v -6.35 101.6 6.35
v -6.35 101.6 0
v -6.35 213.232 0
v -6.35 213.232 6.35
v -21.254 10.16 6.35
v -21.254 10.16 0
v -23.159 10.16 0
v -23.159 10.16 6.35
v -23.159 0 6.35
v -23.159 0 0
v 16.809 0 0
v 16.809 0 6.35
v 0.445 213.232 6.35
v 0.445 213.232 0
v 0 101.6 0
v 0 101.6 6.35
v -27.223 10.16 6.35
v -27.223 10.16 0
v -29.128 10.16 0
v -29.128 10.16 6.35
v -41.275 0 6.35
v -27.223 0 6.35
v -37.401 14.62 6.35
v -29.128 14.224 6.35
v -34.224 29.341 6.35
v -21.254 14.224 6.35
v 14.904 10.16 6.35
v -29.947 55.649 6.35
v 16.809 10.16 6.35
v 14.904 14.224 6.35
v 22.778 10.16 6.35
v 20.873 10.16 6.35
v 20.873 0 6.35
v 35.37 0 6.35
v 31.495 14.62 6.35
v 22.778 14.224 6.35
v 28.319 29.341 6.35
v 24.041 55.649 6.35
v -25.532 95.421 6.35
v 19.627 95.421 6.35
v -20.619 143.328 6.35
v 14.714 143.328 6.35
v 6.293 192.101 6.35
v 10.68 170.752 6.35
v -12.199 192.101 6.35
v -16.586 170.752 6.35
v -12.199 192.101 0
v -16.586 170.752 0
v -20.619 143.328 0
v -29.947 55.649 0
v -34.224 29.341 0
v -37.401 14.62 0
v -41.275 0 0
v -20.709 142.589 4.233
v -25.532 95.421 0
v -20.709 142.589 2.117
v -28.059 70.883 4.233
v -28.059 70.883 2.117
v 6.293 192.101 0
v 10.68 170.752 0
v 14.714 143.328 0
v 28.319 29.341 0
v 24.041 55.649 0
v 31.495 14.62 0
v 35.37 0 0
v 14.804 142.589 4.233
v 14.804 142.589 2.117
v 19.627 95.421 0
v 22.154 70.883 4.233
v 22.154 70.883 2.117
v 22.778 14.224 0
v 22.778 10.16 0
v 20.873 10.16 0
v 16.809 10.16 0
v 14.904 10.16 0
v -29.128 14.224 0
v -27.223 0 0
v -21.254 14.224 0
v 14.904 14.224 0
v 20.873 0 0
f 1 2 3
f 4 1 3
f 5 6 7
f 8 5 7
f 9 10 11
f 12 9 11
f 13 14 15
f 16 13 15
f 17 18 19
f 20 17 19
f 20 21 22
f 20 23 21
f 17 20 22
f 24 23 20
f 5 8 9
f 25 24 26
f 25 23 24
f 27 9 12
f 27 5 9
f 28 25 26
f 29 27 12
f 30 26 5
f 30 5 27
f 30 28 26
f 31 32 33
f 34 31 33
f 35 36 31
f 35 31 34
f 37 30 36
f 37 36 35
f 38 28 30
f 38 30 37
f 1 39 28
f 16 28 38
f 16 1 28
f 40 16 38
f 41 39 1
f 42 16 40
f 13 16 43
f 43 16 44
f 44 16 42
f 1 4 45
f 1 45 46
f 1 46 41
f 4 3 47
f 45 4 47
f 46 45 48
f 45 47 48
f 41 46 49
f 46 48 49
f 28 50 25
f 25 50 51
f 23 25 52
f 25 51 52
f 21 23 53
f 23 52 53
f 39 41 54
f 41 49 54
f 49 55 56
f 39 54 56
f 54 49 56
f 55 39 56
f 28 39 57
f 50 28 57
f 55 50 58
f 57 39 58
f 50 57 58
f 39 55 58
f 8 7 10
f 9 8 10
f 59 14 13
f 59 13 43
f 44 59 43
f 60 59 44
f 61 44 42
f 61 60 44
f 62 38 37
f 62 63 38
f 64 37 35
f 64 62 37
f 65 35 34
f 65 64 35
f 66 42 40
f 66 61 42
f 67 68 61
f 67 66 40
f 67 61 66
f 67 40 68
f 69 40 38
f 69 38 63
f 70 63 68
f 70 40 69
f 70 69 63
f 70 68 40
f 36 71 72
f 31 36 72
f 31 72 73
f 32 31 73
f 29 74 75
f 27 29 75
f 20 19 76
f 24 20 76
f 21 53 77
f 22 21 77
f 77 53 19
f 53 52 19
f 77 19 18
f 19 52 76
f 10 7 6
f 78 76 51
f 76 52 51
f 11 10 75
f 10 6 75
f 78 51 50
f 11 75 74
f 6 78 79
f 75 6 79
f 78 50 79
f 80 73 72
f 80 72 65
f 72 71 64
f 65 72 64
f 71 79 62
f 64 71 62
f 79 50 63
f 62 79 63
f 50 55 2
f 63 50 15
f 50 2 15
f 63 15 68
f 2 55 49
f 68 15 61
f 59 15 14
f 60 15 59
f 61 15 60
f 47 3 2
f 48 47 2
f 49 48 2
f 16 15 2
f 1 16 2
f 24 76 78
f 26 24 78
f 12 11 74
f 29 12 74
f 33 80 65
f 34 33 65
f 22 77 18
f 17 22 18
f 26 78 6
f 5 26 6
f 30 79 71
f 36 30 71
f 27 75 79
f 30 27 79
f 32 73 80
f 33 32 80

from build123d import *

# Parameters (mm, degrees)
BOSS_EXTRUDE1_DEPTH = 6.35


with BuildPart() as part:
    # Sketch1 → Boss-Extrude1 (new body)
    with BuildSketch(Plane.XY):
        with BuildLine():
            Line((-41.275, 0), (-27.223297828, 0))
            Line((-27.223297828, 0), (-27.223297828, 10.16))
            Line((-27.223297828, 10.16), (-29.128297828, 10.16))
            Line((-29.128297828, 10.16), (-29.128297828, 14.224))
            Line((-29.128297828, 14.224), (-21.254297828, 14.224))
            Line((-21.254297828, 14.224), (-21.254297828, 10.16))
            Line((-21.254297828, 10.16), (-23.159297828, 10.16))
            Line((-23.159297828, 10.16), (-23.159297828, 0))
            Line((-23.159297828, 0), (16.809297828, 0))
            Line((16.809297828, 0), (16.809297828, 10.16))
            Line((16.809297828, 10.16), (14.904297828, 10.16))
            Line((14.904297828, 10.16), (14.904297828, 14.224))
            Line((14.904297828, 14.224), (22.778297828, 14.224))
            Line((22.778297828, 14.224), (22.778297828, 10.16))
            Line((22.778297828, 10.16), (20.873297828, 10.16))
            Line((20.873297828, 10.16), (20.873297828, 0))
            Line((20.873297828, 0), (35.369845619, 0))
            add(Edge.make_bspline(
                [(0.444845619, 213.232011469), (22.600754388, 143.751265393), (14.929286493, 69.840750236), (35.369845619, 0)],
                knots=[0, 0, 0, 0, 1, 1, 1, 1], degree=3))
            Line((0.444845619, 213.232011469), (0, 101.6))
            Line((0, 101.6), (-6.35, 101.6))
            Line((-6.35, 101.6), (-6.35, 213.232011469))
            add(Edge.make_bspline(
                [(-6.35, 213.232011469), (-28.505908769, 143.751265393), (-20.834440874, 69.840750236), (-41.275, 0)],
                knots=[0, 0, 0, 0, 1, 1, 1, 1], degree=3))
        make_face()
    extrude(amount=BOSS_EXTRUDE1_DEPTH)


solid = part.part
